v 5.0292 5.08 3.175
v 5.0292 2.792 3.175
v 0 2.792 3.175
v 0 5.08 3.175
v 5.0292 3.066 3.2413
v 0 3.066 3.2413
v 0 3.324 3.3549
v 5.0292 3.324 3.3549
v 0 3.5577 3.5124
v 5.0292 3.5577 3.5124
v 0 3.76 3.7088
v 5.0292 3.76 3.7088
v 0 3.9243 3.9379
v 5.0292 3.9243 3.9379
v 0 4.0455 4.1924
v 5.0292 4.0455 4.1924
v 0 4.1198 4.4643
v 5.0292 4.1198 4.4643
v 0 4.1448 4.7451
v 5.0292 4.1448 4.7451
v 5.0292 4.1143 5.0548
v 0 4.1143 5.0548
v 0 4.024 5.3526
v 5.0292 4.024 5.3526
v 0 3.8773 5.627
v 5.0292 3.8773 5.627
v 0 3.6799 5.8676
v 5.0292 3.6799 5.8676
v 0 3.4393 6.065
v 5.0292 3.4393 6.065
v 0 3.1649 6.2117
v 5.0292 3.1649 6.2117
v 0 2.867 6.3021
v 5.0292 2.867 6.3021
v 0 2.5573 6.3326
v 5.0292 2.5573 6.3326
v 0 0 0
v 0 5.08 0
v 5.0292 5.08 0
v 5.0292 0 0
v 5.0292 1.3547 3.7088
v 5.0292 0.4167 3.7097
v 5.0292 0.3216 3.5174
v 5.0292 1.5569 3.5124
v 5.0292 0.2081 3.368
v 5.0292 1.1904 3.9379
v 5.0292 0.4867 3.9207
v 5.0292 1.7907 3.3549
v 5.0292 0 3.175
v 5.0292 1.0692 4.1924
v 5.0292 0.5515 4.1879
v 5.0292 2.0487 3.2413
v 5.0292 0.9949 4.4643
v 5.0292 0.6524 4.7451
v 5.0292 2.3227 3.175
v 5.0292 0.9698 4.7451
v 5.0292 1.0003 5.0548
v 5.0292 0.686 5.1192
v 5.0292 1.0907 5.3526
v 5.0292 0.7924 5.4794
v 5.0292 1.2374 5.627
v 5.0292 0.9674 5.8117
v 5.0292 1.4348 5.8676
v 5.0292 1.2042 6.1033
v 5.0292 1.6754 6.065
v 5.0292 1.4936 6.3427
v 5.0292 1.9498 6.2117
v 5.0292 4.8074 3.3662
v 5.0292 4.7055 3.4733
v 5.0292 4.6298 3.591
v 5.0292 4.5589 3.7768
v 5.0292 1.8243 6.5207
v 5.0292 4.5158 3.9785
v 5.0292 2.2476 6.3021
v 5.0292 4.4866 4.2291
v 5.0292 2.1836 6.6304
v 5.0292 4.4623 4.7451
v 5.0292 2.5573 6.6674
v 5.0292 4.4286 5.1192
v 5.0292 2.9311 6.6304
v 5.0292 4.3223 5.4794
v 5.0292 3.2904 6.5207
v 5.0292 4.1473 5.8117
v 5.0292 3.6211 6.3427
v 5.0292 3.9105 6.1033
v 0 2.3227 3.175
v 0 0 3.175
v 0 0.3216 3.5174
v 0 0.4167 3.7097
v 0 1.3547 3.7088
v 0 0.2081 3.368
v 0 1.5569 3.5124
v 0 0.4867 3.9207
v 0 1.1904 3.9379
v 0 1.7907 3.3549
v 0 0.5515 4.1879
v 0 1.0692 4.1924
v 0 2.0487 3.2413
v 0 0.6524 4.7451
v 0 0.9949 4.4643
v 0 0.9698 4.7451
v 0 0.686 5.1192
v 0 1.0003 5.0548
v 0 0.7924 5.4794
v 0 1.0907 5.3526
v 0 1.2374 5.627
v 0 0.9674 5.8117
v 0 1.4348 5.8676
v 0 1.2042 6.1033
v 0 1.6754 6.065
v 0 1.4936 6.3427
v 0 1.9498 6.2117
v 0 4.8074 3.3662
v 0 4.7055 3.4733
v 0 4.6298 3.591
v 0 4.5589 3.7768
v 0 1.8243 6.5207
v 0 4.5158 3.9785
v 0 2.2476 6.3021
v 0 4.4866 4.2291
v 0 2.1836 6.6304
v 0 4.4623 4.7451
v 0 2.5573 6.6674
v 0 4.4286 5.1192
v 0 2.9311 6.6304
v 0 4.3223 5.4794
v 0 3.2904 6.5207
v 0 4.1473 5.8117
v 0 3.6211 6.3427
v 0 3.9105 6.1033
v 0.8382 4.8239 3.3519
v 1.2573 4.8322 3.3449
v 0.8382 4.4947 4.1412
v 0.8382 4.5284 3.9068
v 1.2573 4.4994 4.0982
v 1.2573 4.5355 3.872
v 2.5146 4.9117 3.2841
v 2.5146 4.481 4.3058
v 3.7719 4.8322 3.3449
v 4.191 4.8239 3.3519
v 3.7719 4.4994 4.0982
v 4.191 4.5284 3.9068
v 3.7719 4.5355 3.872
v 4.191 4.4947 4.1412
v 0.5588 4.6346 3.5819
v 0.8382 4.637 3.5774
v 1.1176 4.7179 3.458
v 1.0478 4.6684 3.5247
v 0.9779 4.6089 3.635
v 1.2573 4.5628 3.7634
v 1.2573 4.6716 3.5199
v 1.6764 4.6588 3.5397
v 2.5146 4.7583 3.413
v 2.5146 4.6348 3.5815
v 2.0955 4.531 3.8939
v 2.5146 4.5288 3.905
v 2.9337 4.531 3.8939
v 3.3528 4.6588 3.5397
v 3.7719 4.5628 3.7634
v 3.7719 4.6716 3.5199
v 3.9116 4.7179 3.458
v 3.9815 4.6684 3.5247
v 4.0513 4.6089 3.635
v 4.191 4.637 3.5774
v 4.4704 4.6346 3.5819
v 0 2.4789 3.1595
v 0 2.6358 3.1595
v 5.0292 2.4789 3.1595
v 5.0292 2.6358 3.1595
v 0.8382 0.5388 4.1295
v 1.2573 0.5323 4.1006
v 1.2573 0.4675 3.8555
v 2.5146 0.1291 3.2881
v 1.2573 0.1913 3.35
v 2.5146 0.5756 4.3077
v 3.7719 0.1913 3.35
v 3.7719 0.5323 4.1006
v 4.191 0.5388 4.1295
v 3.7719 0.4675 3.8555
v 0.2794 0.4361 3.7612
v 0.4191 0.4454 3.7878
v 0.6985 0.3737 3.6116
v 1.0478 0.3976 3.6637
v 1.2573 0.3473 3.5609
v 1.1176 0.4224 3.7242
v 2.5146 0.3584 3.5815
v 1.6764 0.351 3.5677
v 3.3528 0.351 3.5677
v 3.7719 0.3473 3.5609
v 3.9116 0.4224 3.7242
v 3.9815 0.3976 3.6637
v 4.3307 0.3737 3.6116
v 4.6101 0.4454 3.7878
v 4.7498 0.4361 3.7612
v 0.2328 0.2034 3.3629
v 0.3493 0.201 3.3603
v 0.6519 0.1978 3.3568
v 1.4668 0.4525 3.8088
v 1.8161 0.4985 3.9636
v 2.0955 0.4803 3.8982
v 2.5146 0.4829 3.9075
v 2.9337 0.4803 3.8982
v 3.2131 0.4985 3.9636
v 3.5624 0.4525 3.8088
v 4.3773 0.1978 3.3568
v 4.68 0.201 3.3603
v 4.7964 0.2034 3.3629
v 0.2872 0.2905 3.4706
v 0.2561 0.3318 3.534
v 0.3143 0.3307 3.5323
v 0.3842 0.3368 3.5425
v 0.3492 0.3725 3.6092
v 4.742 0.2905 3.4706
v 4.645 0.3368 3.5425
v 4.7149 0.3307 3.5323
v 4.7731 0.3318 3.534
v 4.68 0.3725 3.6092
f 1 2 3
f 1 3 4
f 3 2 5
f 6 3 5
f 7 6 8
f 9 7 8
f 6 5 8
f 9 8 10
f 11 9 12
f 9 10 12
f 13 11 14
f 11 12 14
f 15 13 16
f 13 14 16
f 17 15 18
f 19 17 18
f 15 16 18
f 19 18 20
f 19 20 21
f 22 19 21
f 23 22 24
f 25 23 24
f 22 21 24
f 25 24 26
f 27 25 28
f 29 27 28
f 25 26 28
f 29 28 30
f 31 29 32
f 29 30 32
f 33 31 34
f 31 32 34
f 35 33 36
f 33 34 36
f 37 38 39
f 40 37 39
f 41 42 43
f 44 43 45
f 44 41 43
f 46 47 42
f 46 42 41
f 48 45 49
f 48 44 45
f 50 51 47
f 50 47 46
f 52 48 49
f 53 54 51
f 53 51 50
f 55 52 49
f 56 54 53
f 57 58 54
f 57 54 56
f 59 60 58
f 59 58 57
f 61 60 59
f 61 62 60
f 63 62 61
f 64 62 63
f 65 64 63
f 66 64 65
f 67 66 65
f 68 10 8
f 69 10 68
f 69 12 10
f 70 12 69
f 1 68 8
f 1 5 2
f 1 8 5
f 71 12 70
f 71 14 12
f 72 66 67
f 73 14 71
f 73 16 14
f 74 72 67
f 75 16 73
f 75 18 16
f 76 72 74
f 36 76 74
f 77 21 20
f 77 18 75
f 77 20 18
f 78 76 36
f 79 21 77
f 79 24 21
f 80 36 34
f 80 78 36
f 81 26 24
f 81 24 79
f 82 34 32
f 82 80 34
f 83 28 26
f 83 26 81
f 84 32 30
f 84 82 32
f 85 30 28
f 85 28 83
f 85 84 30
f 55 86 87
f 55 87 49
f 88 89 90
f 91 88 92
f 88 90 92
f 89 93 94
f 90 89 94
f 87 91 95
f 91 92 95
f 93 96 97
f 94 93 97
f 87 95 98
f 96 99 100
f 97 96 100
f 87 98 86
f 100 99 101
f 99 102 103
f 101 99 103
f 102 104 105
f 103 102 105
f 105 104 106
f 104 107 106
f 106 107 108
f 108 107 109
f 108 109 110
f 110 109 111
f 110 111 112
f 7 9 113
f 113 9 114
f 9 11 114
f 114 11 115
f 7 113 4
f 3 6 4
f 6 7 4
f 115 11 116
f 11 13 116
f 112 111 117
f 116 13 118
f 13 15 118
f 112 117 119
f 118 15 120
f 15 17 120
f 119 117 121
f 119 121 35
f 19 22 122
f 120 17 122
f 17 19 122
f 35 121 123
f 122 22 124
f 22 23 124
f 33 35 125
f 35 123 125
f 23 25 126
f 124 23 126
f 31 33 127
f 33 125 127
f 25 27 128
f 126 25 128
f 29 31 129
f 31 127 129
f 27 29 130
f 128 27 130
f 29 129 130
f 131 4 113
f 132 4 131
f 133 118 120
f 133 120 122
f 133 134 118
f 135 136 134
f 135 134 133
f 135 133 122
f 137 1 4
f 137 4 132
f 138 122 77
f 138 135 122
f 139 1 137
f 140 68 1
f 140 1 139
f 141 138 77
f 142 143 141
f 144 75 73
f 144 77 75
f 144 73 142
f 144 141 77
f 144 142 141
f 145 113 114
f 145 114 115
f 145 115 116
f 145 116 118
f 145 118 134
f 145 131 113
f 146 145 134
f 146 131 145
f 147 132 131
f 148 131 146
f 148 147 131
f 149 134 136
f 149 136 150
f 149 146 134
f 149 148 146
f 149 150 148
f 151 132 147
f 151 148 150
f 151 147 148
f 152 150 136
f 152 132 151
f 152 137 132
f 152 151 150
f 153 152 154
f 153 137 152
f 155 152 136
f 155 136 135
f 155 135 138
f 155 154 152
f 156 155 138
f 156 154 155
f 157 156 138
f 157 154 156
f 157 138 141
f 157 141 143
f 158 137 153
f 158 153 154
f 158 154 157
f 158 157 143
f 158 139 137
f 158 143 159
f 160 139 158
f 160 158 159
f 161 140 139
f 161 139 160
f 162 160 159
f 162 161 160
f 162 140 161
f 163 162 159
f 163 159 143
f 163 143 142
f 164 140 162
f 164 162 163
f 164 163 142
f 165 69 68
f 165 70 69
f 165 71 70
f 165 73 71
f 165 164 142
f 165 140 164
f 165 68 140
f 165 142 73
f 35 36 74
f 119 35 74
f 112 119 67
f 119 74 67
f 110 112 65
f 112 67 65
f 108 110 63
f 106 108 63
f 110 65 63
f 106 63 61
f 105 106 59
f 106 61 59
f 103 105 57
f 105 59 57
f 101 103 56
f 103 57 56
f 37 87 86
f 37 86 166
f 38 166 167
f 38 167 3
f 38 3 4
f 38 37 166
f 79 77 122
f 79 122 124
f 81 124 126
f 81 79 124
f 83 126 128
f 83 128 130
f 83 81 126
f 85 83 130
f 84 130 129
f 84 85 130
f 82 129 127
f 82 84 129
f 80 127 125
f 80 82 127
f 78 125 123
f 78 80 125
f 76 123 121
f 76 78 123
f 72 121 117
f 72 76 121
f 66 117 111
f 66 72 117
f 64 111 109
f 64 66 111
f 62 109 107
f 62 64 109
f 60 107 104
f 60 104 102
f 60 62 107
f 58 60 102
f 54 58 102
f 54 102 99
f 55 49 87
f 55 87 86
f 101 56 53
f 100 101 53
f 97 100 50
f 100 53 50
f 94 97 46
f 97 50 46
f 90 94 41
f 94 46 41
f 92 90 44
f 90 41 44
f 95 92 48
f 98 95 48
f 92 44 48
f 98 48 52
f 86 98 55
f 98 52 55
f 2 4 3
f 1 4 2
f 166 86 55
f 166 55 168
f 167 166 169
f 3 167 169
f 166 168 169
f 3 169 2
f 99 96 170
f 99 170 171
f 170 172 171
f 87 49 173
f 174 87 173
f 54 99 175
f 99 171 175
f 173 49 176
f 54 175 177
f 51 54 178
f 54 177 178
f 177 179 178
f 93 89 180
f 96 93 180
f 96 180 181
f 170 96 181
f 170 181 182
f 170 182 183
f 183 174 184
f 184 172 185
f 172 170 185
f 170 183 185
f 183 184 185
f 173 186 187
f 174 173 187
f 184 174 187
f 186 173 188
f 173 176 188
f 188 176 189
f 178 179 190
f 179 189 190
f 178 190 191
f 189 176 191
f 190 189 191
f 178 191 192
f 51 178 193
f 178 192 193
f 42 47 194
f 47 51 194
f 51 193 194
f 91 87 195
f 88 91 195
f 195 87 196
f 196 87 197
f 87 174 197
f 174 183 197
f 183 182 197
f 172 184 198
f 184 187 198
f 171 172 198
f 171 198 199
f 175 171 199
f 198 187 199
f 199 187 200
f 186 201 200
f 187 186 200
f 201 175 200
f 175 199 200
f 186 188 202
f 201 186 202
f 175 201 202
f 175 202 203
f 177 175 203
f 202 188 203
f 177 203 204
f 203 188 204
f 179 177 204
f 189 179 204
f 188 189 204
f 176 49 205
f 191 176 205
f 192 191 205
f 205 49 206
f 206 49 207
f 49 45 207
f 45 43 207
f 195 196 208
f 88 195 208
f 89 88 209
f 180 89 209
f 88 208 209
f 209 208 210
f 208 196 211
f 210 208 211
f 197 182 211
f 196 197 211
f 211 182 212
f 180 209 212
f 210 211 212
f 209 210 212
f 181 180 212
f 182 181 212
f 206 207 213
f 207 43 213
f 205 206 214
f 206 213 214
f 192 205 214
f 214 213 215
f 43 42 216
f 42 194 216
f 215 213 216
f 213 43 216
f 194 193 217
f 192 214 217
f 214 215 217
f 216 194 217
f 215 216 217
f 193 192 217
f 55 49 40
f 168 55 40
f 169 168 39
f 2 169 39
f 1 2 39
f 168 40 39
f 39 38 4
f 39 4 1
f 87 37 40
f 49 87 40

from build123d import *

# Parameters (mm, degrees)
F0_W     = 5.0292
F0_H     = 5.08
F1_DEPTH = 3.175
F3_DEPTH = 5.0292
F5_DEPTH = 5.0292


with BuildPart() as f1:
    # F0 (on Top) → F1 (new body)
    with BuildSketch(Plane.XY):
        with Locations((2.5146, 2.54)):
            Rectangle(F0_W, F0_H)
    extrude(amount=F1_DEPTH)


with BuildPart() as f3:
    # F2 (on face) → F3 (new body)
    with BuildSketch(Plane.YZ.offset(5.0292)):
        with BuildLine():
            add(Edge.make_bspline(
                [(5.08, 3.175), (4.909216309, 3.2808363932), (4.499877674, 3.5345077154), (4.4761133674, 4.2993341407), (4.4622639716, 4.7450607578)],
                knots=[0, 0, 0, 0, 0.4172185971, 1, 1, 1, 1], degree=3))
            ThreePointArc((4.4622639716, 4.7450607578), (2.5573429317, 6.6674052642), (0.6524218918, 4.7450607578))
            add(Edge.make_bspline(
                [(0, 3.175), (0.1302521136, 3.2853480693), (0.4543354823, 3.559907714), (0.5782874001, 4.3015133246), (0.6524218918, 4.7450607578)],
                knots=[0, 0, 0, 0, 0.4019092806, 1, 1, 1, 1], degree=3))
            Line((0, 3.175), (5.08, 3.175))
        make_face()
    extrude(amount=-F3_DEPTH)


with BuildPart() as f5_tool:
    # F4 (on face) → F5 (new body)
    with BuildSketch(Plane.YZ.offset(5.0292)):
        with BuildLine():
            ThreePointArc((4.1448429317, 4.7450607578), (3.6798749468, 5.8675927729), (2.5573429317, 6.3325607578))
            Line((2.5573429317, 6.3325607578), (2.5573429317, 4.7450607578))
            Line((2.5573429317, 4.7450607578), (4.1448429317, 4.7450607578))
        make_face()
        with BuildLine():
            Line((2.5573429317, 4.7450607578), (2.5573429317, 6.3325607578))
            ThreePointArc((2.5573429317, 6.3325607578), (1.4348109166, 5.8675927729), (0.9698429317, 4.7450607578))
            Line((0.9698429317, 4.7450607578), (2.5573429317, 4.7450607578))
        make_face()
        with BuildLine():
            Line((4.1448429317, 4.7450607578), (2.5573429317, 4.7450607578))
            Line((2.5573429317, 4.7450607578), (0.9698429317, 4.7450607578))
            ThreePointArc((0.9698429317, 4.7450607578), (2.5573429317, 3.1575607578), (4.1448429317, 4.7450607578))
        make_face()
    extrude(amount=-F5_DEPTH)


with BuildPart() as f1_1:
    add(f1.part)

    # F5: cut by f5_tool
    add(f5_tool.part, mode=Mode.SUBTRACT)


with BuildPart() as f3_1:
    add(f3.part)

    # F5: cut by f5_tool
    add(f5_tool.part, mode=Mode.SUBTRACT)


solid = Compound([f1_1.part, f3_1.part])
